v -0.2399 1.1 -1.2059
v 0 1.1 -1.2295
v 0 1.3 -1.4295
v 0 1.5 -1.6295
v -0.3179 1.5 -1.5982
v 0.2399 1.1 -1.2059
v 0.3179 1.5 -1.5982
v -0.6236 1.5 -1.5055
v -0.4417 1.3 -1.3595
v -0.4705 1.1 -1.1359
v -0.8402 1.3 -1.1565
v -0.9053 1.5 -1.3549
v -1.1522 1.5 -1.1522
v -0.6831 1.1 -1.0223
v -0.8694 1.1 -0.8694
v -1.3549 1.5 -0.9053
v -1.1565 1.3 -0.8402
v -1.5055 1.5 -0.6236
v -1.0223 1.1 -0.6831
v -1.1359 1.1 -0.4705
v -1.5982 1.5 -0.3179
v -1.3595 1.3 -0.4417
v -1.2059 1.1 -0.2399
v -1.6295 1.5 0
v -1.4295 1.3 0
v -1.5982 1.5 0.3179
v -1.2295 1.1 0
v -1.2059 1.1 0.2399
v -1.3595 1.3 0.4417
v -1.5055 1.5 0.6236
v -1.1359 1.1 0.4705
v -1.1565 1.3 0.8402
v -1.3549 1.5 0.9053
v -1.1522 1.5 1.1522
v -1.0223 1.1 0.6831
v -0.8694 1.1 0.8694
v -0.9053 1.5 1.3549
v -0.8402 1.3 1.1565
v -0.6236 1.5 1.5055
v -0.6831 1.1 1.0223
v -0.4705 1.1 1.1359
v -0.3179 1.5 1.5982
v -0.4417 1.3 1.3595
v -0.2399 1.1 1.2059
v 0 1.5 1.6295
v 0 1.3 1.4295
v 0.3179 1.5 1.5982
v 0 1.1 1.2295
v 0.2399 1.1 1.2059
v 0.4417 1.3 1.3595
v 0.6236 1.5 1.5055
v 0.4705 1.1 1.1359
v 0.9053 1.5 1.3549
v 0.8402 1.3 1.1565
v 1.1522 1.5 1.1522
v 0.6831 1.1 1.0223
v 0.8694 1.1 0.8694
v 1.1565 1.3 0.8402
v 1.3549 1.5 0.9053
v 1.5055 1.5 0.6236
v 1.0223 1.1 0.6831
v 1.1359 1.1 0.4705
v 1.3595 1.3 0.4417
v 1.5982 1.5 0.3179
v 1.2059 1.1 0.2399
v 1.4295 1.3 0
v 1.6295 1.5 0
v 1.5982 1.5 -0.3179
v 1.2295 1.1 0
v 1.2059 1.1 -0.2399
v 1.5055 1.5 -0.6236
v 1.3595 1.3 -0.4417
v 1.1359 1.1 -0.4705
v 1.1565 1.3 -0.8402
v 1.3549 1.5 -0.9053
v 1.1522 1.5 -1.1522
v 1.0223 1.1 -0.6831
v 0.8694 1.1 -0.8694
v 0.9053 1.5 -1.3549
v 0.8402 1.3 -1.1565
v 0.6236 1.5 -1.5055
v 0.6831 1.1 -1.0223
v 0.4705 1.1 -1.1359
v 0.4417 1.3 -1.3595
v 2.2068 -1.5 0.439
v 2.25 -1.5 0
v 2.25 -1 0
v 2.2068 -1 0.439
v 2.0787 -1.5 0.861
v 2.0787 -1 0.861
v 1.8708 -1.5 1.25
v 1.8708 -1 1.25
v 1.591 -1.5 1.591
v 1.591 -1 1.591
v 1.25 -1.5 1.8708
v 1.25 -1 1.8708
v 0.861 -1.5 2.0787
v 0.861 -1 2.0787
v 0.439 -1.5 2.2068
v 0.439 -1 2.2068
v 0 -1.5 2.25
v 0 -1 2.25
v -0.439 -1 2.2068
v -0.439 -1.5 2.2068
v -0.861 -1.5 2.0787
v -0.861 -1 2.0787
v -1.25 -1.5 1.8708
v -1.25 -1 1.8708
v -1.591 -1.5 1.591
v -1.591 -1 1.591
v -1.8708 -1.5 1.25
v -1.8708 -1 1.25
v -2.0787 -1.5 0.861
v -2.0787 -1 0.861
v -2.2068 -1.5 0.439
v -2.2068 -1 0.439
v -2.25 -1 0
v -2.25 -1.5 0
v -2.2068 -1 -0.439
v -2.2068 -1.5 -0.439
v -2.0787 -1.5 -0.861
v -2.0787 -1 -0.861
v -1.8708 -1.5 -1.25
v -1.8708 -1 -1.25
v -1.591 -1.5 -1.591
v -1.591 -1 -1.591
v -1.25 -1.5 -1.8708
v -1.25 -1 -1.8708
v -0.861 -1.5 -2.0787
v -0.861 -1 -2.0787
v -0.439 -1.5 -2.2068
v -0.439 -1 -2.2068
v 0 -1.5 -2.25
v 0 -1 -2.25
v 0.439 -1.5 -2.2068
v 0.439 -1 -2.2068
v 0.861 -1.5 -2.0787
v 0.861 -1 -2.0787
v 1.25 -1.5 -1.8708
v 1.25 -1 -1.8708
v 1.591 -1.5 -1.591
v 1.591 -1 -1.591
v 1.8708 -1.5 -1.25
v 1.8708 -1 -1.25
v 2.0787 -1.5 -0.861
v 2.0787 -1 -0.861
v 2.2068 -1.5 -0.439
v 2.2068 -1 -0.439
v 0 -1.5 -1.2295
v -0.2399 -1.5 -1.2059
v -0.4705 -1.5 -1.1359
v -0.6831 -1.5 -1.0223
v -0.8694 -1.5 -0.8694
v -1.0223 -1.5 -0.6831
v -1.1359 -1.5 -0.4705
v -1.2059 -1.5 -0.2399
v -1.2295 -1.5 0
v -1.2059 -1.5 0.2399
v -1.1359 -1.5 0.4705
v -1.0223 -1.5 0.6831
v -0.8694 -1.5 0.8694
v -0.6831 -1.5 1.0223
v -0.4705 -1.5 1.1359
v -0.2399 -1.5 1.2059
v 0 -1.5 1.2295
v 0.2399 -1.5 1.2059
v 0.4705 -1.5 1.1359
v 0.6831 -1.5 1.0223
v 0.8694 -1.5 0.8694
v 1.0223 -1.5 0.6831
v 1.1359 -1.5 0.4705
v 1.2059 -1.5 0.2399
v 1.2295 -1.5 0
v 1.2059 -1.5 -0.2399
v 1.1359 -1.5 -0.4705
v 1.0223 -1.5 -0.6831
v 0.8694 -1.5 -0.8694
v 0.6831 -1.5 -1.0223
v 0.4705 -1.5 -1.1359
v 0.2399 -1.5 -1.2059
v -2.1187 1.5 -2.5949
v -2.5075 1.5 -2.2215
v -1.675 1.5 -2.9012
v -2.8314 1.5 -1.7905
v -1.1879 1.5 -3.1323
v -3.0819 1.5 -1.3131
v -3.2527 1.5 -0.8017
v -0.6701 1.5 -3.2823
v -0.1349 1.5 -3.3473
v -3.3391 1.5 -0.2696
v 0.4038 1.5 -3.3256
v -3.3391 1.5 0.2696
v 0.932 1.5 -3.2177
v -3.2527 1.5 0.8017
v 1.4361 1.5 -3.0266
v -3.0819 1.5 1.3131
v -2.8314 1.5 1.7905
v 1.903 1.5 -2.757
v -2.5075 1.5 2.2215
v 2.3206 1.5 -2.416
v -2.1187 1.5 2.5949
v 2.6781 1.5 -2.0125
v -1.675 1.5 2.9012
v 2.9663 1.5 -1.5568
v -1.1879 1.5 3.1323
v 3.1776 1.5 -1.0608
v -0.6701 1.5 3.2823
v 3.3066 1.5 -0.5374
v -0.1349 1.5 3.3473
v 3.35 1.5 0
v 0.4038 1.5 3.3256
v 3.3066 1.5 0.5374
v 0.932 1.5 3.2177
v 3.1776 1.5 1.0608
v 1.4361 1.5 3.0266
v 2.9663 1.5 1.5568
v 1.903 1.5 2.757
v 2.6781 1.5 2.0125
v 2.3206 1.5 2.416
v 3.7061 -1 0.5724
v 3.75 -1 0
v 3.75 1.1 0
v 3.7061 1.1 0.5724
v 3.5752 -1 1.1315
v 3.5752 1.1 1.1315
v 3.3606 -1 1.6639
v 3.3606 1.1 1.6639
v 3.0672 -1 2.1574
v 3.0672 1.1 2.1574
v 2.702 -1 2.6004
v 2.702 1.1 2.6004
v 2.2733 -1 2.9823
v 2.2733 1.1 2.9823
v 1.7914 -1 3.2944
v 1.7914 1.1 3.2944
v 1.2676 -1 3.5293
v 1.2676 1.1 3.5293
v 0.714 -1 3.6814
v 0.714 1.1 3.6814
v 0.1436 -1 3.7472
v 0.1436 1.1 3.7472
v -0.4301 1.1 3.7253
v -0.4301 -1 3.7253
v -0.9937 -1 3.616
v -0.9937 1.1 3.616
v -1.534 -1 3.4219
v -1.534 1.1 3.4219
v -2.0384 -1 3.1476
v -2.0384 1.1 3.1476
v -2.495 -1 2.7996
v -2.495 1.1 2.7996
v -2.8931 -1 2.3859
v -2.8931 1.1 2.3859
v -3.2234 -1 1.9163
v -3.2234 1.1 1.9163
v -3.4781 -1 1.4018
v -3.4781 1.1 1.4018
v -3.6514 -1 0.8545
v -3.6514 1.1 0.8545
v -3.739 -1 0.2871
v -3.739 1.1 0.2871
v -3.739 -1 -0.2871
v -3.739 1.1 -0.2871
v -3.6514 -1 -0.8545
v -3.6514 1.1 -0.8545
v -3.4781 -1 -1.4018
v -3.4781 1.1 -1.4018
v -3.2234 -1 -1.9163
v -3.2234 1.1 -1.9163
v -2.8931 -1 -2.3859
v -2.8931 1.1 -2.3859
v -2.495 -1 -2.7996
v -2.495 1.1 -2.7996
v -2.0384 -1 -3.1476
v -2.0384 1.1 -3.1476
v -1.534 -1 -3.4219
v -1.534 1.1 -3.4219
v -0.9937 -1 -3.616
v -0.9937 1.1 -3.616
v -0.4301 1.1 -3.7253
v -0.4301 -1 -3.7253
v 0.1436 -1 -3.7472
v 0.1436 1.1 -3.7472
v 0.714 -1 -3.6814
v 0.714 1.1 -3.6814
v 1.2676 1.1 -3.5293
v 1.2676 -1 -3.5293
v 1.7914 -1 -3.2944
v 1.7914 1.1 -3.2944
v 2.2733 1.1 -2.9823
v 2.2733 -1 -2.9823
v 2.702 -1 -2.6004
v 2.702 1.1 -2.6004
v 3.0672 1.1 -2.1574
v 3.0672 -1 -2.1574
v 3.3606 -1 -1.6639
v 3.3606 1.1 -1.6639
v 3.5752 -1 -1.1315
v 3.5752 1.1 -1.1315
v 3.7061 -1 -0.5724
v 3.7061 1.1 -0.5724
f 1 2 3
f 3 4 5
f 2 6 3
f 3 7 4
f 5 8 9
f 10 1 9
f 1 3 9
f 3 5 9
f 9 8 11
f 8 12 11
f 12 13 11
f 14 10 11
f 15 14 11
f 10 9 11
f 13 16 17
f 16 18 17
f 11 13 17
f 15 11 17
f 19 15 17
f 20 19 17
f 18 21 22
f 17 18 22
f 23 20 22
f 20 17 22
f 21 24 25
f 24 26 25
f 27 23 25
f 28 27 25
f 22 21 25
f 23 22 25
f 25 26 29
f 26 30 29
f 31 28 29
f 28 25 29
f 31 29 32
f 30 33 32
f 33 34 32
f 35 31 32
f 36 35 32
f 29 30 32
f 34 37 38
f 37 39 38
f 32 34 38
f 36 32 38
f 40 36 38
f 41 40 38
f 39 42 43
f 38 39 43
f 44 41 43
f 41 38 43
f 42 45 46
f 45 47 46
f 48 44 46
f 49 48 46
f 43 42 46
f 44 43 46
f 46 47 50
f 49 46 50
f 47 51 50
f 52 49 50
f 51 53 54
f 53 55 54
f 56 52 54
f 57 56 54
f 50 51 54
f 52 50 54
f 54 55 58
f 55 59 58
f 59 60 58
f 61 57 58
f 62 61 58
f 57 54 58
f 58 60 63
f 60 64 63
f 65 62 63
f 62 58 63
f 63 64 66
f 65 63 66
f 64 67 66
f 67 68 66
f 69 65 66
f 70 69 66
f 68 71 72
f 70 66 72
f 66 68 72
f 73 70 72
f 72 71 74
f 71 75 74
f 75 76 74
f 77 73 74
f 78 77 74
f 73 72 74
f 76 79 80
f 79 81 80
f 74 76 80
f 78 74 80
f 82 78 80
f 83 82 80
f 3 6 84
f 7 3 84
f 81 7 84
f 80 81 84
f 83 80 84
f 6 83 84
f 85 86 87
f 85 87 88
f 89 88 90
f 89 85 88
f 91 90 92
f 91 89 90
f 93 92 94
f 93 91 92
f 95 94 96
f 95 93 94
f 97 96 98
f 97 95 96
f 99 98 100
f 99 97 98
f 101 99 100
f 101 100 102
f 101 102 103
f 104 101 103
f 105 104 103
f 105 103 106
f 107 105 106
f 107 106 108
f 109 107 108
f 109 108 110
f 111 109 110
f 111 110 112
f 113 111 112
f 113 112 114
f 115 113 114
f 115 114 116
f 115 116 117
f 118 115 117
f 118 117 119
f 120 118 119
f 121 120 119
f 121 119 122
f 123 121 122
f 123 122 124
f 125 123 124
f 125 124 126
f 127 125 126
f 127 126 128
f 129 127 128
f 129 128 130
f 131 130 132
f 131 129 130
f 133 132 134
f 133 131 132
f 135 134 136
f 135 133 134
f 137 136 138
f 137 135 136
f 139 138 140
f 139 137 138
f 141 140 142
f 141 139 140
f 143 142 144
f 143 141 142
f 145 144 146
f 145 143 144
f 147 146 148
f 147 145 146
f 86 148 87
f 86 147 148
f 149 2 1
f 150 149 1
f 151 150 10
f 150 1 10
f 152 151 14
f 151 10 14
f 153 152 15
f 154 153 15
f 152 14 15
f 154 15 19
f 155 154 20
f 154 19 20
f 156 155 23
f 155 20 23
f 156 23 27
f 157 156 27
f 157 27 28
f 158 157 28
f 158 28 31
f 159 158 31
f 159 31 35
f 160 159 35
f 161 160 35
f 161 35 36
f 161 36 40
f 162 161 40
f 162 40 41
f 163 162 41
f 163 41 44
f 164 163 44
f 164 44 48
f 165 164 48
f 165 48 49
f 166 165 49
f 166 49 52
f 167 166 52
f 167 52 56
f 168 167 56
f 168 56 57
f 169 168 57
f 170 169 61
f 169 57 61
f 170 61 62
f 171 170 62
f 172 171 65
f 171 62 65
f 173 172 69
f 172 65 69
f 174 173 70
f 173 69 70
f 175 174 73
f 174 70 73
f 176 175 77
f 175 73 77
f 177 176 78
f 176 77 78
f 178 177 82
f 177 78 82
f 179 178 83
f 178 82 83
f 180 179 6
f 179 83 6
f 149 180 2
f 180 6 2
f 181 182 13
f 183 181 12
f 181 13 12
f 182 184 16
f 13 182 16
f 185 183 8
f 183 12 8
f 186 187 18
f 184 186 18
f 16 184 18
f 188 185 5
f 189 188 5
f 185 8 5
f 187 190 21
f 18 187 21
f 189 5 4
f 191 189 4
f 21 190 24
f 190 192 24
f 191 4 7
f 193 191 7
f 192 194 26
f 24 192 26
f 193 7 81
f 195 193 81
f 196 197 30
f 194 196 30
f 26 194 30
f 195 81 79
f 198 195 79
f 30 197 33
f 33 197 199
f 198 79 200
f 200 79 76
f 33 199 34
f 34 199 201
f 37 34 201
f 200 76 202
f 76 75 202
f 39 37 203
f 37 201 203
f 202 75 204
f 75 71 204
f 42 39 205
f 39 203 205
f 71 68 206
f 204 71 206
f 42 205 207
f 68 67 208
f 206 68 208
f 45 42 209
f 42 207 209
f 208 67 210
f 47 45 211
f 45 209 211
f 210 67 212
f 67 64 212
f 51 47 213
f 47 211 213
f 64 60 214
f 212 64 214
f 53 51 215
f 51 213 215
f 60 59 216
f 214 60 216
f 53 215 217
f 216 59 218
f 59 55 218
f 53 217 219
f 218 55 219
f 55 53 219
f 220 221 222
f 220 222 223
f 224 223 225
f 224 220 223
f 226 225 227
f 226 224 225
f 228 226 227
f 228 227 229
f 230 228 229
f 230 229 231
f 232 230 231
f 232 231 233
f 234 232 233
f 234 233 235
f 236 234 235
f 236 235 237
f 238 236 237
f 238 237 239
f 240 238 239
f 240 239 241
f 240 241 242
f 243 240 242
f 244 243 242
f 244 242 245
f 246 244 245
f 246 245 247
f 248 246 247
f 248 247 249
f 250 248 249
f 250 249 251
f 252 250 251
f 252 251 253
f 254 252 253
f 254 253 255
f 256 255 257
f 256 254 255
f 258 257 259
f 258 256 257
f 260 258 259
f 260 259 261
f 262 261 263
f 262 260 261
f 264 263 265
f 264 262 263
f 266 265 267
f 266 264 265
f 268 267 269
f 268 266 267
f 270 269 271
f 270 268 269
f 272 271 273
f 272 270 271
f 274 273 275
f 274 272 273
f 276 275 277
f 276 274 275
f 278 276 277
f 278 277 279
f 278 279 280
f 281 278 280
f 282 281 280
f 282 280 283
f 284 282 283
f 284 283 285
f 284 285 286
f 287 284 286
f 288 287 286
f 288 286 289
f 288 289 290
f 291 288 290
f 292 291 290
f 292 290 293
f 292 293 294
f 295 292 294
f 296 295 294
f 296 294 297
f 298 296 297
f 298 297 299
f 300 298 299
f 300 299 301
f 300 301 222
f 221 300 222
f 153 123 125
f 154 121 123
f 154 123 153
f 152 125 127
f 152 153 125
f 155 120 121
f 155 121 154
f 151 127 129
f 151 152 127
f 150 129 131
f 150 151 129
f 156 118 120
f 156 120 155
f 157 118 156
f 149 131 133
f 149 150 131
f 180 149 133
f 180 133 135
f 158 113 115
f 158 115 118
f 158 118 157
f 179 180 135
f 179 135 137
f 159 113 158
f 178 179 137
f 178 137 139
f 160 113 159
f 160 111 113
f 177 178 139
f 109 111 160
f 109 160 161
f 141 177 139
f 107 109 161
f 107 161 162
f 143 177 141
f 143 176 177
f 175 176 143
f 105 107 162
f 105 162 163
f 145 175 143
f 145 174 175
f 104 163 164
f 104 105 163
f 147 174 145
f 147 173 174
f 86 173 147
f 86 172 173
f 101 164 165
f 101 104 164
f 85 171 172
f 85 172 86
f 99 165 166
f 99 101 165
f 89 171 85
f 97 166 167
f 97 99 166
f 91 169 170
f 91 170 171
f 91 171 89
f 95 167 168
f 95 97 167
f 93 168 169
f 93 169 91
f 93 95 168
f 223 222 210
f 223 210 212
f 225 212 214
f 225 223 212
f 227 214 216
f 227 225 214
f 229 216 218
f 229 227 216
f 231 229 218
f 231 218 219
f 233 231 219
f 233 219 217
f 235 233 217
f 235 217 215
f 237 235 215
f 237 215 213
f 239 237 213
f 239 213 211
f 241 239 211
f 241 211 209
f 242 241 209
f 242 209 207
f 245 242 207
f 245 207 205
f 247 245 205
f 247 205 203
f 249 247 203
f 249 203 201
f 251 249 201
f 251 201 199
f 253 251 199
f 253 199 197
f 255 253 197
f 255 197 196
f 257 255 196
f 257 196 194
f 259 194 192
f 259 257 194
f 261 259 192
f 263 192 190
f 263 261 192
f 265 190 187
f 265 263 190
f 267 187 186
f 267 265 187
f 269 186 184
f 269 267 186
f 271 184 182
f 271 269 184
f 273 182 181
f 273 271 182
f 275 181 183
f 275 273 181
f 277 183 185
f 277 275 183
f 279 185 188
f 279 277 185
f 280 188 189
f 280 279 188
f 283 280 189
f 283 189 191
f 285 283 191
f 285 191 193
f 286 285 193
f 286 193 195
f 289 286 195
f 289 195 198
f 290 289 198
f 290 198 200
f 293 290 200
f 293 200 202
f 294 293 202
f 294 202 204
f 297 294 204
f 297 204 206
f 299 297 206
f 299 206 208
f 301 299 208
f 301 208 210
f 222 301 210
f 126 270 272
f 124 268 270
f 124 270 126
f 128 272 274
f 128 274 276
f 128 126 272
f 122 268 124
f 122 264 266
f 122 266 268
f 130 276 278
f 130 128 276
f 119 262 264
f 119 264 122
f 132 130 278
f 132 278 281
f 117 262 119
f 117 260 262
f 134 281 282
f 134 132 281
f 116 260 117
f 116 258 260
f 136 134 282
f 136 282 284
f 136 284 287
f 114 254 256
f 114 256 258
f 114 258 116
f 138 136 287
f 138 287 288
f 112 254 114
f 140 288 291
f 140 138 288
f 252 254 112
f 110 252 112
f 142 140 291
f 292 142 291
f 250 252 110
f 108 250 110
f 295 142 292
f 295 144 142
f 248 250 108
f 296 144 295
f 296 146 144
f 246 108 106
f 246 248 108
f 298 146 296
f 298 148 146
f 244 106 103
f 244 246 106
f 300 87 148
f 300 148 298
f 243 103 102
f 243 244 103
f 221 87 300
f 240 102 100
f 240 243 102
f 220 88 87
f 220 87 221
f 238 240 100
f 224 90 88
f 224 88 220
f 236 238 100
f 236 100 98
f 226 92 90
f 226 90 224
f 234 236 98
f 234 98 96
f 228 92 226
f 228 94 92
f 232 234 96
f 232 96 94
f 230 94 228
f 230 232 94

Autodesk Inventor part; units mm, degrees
ref_plane "YZ Plane" through (0, 0, 0) normal (1, 0, 0) x (0, 1, 0)
ref_plane "XZ Plane" through (0, 0, 0) normal (0, 1, 0) x (-1, 0, 0)
ref_plane "XY Plane" through (0, 0, 0) normal (0, 0, 1) x (1, 0, 0)
sketch "Sketch1" plane through (0, 0, 0) normal (0, 0, 1) x (1, 0, 0)
  line L0 (0, 1.5) -> (3.75, 1.5)
  line L1 (3.75, 1.5) -> (3.75, -1)
  line L2 (3.75, -1) -> (2.25, -1)
  line L3 (2.25, -1) -> (2.25, -1.5)
  line L4 (2.25, -1.5) -> (0, -1.5)
  line L5 (0, 1.5) -> (0, -1.5)
  point P0 (0, 0)
  point P1 (0, 0)
  dimension "d0" = 2.5
  dimension "d1" = 0.5
  dimension "d2" = 3.75
  dimension "d3" = 2.25
revolve "Revolution1" add sketch "Sketch1" angle 360 about axis through (0, 1.5, 0) along (0, -1, 0)
sketch "Sketch2" plane through (0, -1.5, 0) normal (0, -1, 0) x (1, 0, 0)
  point P0 (0, 0)
  point P1 (0, 0)
hole "Hole1" at (0, -1.5, 0) direction (0, 1, 0) diameter 2.459 end through all thread size "M3x0.5" class "6H" standard "ANSI Metric M Profile"
chamfer "Chamfer1" distance 0.4 angle 45 2 edges at (0, 1.5, 1.2295) (-3.75, 1.5, 0)
properties part number "RPS Basic M3 Weld Nut" material "Stainless Steel"
